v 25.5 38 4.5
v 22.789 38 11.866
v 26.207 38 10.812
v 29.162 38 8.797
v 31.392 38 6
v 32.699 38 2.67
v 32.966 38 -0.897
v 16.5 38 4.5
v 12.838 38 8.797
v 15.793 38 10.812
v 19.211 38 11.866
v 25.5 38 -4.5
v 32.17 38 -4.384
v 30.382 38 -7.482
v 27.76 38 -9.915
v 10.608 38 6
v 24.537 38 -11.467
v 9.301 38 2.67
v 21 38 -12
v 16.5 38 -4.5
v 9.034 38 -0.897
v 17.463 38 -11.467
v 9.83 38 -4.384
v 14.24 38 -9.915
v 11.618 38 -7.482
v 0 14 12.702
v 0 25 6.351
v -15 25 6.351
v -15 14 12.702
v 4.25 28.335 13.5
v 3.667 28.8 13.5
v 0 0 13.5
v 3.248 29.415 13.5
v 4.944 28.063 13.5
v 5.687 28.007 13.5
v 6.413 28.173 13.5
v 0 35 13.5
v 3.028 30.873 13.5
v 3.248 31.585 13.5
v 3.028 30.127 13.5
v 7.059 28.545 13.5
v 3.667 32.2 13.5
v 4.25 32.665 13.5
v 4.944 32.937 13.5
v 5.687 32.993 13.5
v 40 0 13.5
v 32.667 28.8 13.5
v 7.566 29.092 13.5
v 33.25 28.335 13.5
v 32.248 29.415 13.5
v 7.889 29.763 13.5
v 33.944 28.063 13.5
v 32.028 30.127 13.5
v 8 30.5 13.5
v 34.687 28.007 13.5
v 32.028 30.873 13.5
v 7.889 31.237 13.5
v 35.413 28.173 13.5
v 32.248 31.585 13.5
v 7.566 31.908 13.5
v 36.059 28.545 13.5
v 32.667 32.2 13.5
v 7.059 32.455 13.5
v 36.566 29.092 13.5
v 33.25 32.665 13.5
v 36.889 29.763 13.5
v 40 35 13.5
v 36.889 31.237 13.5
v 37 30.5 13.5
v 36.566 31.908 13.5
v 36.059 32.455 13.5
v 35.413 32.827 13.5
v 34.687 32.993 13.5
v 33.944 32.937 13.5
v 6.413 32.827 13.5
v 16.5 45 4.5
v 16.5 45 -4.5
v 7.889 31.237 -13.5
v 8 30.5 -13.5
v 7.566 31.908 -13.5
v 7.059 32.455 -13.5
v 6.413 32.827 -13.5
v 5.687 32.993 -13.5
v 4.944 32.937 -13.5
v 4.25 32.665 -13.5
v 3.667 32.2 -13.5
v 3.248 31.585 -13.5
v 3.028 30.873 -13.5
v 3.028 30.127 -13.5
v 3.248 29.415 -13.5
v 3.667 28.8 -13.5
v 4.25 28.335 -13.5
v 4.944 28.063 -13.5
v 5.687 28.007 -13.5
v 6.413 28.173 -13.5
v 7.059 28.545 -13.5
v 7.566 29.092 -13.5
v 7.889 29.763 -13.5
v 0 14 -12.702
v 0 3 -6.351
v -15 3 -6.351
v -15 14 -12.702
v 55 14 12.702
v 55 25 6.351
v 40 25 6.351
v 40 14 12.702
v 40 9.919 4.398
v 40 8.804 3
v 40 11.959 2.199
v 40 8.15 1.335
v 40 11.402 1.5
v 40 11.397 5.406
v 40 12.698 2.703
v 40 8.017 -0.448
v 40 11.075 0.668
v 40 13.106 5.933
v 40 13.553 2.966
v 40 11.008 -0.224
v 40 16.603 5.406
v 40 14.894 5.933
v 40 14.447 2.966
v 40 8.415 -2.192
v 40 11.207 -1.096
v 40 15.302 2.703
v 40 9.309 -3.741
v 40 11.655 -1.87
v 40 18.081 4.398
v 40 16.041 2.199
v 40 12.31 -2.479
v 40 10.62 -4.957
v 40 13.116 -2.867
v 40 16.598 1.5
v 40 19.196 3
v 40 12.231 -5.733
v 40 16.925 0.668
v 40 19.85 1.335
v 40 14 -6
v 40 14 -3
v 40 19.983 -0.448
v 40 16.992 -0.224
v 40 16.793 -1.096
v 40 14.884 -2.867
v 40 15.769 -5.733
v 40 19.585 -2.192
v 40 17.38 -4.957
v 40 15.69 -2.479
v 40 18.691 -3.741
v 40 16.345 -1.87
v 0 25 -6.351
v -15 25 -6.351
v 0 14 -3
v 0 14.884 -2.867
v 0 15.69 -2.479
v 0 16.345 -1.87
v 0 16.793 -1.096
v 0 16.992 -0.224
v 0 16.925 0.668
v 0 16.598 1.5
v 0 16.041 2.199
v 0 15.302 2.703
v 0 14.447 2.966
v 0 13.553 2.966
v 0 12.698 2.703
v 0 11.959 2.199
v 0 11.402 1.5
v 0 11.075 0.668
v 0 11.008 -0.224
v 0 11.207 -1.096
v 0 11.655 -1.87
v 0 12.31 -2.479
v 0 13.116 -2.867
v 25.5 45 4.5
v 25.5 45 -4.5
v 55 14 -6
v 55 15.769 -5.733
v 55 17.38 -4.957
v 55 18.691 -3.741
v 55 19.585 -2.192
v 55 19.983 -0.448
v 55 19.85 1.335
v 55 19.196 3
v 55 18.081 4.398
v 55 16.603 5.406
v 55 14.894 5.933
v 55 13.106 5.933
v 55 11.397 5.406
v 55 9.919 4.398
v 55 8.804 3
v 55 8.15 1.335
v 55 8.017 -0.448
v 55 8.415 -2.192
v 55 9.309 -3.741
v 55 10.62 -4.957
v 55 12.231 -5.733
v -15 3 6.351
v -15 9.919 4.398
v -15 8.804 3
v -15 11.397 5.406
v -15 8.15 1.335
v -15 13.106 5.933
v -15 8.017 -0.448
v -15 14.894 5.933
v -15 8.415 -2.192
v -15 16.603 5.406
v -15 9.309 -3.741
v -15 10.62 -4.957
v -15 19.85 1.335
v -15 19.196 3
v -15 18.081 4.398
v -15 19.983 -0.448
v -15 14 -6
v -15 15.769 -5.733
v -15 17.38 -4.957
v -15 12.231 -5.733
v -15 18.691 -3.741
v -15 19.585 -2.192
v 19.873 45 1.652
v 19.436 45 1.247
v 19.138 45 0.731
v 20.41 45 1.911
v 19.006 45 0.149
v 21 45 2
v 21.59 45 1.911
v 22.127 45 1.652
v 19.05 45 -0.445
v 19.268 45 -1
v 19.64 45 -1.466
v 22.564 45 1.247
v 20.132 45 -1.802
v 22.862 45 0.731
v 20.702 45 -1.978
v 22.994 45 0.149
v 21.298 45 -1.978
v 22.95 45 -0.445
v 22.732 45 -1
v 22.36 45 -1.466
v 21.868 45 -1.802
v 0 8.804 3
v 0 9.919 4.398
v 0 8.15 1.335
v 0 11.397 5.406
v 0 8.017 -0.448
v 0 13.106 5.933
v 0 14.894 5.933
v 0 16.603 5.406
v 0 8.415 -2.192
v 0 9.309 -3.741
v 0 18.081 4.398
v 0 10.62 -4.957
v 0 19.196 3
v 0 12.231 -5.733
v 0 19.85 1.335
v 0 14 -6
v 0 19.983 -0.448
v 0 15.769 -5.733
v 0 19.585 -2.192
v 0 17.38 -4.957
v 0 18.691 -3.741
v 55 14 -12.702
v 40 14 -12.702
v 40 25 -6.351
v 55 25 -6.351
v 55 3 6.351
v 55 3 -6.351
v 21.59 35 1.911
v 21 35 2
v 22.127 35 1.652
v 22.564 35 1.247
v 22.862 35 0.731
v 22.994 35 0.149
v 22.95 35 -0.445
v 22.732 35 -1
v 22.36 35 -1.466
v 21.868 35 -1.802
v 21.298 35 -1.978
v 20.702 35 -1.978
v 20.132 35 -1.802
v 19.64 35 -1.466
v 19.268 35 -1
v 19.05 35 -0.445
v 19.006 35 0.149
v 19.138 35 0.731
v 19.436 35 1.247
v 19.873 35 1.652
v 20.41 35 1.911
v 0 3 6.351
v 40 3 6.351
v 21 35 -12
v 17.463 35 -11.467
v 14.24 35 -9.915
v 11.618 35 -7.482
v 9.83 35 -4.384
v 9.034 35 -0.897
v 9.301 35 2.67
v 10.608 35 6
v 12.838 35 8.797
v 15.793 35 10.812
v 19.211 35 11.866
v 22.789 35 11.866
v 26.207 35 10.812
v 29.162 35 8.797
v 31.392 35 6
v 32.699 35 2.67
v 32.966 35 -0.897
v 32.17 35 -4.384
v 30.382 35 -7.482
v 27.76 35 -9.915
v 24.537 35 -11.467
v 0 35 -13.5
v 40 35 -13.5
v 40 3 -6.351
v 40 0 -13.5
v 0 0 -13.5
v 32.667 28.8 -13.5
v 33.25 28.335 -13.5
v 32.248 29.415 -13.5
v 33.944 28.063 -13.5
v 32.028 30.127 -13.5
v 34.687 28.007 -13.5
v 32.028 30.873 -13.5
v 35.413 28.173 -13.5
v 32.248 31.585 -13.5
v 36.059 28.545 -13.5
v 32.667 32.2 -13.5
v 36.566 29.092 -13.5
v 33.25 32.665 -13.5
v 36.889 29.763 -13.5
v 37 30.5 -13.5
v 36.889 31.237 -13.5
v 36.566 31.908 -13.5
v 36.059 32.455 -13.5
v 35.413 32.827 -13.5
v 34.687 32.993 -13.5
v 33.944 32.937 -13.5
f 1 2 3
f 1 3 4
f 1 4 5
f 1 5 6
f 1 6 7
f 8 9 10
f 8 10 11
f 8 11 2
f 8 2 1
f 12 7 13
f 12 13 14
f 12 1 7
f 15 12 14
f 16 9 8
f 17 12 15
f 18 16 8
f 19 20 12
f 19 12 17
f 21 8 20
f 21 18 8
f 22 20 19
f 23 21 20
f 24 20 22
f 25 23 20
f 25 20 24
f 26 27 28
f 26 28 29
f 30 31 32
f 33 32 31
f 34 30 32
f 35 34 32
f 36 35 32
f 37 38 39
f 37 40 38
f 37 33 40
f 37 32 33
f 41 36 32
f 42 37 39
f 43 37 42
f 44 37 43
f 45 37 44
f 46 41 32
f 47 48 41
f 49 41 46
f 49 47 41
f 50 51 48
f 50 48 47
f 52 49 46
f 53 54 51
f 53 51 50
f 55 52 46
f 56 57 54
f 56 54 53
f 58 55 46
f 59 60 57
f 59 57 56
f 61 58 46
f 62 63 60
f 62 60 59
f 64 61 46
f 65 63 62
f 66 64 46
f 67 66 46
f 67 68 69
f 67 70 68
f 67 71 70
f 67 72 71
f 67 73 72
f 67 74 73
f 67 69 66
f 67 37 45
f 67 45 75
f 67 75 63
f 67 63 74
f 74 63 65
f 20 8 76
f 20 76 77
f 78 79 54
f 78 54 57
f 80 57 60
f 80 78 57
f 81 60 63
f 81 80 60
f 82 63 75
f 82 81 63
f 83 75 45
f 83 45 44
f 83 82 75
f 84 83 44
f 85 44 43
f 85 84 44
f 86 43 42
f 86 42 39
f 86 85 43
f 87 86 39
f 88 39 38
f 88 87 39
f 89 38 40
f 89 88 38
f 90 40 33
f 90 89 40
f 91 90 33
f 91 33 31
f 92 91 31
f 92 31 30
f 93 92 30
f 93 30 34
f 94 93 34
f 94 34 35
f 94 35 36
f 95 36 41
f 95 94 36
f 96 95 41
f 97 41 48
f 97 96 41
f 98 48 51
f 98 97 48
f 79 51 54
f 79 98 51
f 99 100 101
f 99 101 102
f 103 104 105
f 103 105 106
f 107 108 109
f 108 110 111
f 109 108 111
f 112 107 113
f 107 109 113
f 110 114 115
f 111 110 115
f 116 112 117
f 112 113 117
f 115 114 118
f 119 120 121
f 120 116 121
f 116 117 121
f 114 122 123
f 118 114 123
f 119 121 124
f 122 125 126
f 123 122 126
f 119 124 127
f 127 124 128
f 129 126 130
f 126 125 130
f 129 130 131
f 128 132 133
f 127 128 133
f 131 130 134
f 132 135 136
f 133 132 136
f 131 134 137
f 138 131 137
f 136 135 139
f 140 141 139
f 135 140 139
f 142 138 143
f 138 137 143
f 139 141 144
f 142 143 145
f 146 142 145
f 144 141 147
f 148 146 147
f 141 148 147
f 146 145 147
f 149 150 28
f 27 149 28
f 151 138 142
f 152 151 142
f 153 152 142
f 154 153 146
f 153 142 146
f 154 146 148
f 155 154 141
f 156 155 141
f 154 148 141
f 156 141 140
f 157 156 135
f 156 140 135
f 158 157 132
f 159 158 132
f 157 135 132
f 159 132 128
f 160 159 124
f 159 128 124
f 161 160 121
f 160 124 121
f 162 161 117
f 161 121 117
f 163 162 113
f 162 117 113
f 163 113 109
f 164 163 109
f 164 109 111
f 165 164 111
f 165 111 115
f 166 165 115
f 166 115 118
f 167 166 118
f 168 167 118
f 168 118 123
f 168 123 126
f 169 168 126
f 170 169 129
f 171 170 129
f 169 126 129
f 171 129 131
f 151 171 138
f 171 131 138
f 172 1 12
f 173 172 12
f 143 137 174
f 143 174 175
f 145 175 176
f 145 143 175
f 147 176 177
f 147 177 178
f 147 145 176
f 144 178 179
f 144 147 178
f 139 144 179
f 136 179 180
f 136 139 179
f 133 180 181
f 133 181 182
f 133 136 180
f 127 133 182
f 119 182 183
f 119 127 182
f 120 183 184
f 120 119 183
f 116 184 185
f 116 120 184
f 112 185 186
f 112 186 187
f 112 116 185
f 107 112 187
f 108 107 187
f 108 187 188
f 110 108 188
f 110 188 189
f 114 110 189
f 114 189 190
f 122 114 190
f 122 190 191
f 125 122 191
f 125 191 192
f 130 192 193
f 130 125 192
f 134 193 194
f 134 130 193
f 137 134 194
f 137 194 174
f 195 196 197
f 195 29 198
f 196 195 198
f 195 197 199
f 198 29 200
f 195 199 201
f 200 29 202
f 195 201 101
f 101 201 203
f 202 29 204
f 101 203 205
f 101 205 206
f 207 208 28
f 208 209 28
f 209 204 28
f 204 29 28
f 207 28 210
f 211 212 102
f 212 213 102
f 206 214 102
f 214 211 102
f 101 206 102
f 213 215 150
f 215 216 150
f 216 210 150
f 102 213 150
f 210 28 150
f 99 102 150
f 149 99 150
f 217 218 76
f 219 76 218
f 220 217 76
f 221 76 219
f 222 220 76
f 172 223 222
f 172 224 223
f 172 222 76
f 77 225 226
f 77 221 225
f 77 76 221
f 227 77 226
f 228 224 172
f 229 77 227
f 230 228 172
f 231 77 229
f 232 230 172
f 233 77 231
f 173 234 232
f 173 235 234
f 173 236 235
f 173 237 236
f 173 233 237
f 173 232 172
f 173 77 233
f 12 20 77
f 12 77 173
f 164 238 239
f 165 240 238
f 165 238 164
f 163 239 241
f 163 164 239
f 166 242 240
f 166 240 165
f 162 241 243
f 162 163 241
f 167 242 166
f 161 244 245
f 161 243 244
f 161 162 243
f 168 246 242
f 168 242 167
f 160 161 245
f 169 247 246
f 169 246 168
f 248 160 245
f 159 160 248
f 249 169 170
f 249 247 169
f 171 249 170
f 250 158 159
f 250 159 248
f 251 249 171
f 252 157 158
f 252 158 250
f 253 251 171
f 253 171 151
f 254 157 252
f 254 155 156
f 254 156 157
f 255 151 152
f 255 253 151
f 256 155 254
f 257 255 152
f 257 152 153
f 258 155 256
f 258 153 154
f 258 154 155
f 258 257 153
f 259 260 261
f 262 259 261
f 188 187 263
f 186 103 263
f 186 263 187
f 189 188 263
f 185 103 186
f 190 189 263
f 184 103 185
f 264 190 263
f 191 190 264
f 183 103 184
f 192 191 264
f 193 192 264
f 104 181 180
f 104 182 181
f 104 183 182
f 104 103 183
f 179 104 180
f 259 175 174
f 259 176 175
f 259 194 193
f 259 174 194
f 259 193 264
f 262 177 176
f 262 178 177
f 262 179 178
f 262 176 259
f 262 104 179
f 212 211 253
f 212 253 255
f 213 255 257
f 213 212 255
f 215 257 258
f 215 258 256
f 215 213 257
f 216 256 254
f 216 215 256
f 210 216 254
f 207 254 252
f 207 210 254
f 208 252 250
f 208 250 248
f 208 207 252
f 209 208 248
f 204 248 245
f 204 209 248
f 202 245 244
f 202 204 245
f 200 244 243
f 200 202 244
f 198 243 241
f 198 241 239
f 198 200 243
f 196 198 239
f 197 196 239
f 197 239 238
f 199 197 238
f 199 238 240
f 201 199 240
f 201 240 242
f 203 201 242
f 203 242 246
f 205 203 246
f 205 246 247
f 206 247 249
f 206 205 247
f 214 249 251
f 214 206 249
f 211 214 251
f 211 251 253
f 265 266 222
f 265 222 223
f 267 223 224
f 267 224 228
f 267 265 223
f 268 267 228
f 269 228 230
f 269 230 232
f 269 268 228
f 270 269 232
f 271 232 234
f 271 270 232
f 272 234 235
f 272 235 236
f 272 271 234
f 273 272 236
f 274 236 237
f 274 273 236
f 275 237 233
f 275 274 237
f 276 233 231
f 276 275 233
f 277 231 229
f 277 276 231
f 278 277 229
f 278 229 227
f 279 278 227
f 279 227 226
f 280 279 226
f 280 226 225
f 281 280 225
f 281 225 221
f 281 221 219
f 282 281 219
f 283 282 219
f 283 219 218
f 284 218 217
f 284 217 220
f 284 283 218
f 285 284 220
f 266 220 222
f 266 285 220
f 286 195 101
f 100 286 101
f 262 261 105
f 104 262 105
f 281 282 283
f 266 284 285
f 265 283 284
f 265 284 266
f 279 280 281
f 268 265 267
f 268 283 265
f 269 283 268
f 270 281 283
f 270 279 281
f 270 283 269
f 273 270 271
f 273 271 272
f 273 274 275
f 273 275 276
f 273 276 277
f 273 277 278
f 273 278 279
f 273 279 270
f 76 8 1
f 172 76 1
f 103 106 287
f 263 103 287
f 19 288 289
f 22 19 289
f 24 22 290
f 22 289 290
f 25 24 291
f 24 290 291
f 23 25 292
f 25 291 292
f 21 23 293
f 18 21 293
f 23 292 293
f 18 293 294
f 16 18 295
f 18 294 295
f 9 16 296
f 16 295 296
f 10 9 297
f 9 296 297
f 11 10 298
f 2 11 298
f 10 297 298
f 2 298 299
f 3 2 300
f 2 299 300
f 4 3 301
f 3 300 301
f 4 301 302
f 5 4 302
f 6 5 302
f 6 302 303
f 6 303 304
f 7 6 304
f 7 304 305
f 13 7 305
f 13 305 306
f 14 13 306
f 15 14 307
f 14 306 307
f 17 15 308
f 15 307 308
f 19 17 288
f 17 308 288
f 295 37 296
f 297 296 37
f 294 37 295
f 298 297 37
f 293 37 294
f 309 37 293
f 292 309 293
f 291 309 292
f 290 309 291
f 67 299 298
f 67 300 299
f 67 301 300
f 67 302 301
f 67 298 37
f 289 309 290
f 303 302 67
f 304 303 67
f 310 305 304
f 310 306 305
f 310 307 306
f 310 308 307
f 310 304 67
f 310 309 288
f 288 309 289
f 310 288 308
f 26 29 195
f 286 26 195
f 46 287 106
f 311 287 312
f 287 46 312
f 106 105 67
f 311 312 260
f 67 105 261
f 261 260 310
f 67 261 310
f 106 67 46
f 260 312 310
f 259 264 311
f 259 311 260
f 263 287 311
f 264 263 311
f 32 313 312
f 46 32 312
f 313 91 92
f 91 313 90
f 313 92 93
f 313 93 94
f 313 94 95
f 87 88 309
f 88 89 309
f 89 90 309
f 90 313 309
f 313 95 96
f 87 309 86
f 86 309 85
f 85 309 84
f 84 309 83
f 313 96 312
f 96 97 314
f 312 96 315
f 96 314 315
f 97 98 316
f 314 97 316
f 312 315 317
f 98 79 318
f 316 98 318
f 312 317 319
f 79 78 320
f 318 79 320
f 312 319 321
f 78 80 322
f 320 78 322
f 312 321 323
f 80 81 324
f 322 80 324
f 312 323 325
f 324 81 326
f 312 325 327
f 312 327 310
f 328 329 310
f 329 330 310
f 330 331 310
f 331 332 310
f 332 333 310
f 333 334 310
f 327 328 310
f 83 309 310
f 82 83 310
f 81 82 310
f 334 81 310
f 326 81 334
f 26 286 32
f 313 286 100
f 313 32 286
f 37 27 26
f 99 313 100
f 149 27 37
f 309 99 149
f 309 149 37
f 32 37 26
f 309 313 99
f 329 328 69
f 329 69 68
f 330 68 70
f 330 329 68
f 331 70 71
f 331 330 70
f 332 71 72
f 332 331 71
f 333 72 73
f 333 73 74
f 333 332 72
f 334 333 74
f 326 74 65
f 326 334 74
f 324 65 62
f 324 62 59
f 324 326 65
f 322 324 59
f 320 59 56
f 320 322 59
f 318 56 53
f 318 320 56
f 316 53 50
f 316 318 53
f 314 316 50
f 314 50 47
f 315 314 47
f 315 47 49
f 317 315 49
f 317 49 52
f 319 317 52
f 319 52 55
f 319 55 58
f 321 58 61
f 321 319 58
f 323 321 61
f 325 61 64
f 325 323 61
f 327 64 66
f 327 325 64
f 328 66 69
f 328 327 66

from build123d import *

# Parameters (mm, degrees)
DODANIE_WYCI_GNI_CIE1_DEPTH      = 13.5
DODANIE_WYCI_GNI_CIE1_DEPTH_BACK = 13.5
SZKIC2_R                         = 6
DODANIE_WYCI_GNI_CIE2_DEPTH      = 15
WYTNIJ_WYCI_GNI_CIE2_DEPTH       = 40
DODANIE_WYCI_GNI_CIE3_START      = -55
SZKIC2_6_R                       = 6
DODANIE_WYCI_GNI_CIE3_DEPTH      = 15
DODANIE_WYCI_GNI_CIE4_START      = 35
DODANIE_WYCI_GNI_CIE4_DEPTH      = 3
DODANIE_WYCI_GNI_CIE5_START      = 35
SZKIC3_3_W                       = 9
SZKIC3_3_H                       = 9
SZKIC3_3_R                       = 2
DODANIE_WYCI_GNI_CIE5_DEPTH      = 10


with BuildPart() as part:
    # Szkic1 → Dodanie-wyciągnięcie1 (new, two sides: drawn at the far end of the back side and taken through both)
    with BuildSketch(Plane.XY.offset(-DODANIE_WYCI_GNI_CIE1_DEPTH_BACK)):
        Polygon((40, 35), (0, 35), (0, 33), (0, 0), (40, 0), (40, 33), align=None)
        with BuildLine():
            ThreePointArc((8, 30.5), (3.732233047, 28.732233047), (5.5, 33))
            ThreePointArc((5.5, 33), (7.267766953, 32.267766953), (8, 30.5))
        make_face(mode=Mode.SUBTRACT)
        with BuildLine():
            ThreePointArc((37, 30.5), (32.732233047, 28.732233047), (34.5, 33))
            ThreePointArc((34.5, 33), (36.267766953, 32.267766953), (37, 30.5))
        make_face(mode=Mode.SUBTRACT)
    extrude(amount=DODANIE_WYCI_GNI_CIE1_DEPTH + DODANIE_WYCI_GNI_CIE1_DEPTH_BACK)

    # Szkic2 → Dodanie-wyciągnięcie2 (add)
    with BuildSketch(Plane(origin=(40, 0, 0), x_dir=(0, 0, -1), z_dir=(1, 0, 0))):
        Polygon((6.350852961, 3), (12.701705922, 14), (6.350852961, 25), (-6.350852961, 25), (-12.701705922, 14), (-6.350852961, 3), (1.5e-08, 3), align=None)
        with Locations((0, 14)):
            Circle(SZKIC2_R, mode=Mode.SUBTRACT)
    extrude(amount=DODANIE_WYCI_GNI_CIE2_DEPTH)

    # Szkic2<4> → Wytnij-wyciągnięcie2 (cut)
    with BuildSketch(Plane(origin=(40, 0, 0), x_dir=(0, 0, -1), z_dir=(1, 0, 0))):
        with BuildLine():
            ThreePointArc((3, 14), (-2.121320344, 16.121320344), (0, 11))
            ThreePointArc((0, 11), (2.121320344, 11.878679656), (3, 14))
        make_face()
    extrude(amount=-WYTNIJ_WYCI_GNI_CIE2_DEPTH, mode=Mode.SUBTRACT)

    # Szkic2<6> → Dodanie-wyciągnięcie3 (add)
    with BuildSketch(Plane(origin=(40, 0, 0), x_dir=(0, 0, -1), z_dir=(1, 0, 0)).offset(DODANIE_WYCI_GNI_CIE3_START)):
        Polygon((6.350852961, 3), (12.701705922, 14), (6.350852961, 25), (-6.350852961, 25), (-12.701705922, 14), (-6.350852961, 3), (1.5e-08, 3), align=None)
        with Locations((0, 14)):
            Circle(SZKIC2_6_R, mode=Mode.SUBTRACT)
    extrude(amount=DODANIE_WYCI_GNI_CIE3_DEPTH)

    # Szkic3 → Dodanie-wyciągnięcie4 (add)
    with BuildSketch(Plane(origin=(0, 0, 0), x_dir=(1, 0, 0), z_dir=(0, 1, 0)).offset(DODANIE_WYCI_GNI_CIE4_START)):
        with BuildLine():
            ThreePointArc((33, 0), (21, 12), (9, 0))
            ThreePointArc((9, 0), (21, -12), (33, 0))
        make_face()
        Polygon((16.5, -4.5), (16.5, 0), (16.5, 4.5), (25.5, 4.5), (25.5, 0), (25.5, -4.5), align=None, mode=Mode.SUBTRACT)
    extrude(amount=DODANIE_WYCI_GNI_CIE4_DEPTH)

    # Szkic3<3> → Dodanie-wyciągnięcie5 (add)
    with BuildSketch(Plane(origin=(0, 0, 0), x_dir=(1, 0, 0), z_dir=(0, 1, 0)).offset(DODANIE_WYCI_GNI_CIE5_START)):
        with Locations((21, 0)):
            Rectangle(SZKIC3_3_W, SZKIC3_3_H)
        with Locations((21, 0)):
            Circle(SZKIC3_3_R, mode=Mode.SUBTRACT)
    extrude(amount=DODANIE_WYCI_GNI_CIE5_DEPTH)


solid = part.part
